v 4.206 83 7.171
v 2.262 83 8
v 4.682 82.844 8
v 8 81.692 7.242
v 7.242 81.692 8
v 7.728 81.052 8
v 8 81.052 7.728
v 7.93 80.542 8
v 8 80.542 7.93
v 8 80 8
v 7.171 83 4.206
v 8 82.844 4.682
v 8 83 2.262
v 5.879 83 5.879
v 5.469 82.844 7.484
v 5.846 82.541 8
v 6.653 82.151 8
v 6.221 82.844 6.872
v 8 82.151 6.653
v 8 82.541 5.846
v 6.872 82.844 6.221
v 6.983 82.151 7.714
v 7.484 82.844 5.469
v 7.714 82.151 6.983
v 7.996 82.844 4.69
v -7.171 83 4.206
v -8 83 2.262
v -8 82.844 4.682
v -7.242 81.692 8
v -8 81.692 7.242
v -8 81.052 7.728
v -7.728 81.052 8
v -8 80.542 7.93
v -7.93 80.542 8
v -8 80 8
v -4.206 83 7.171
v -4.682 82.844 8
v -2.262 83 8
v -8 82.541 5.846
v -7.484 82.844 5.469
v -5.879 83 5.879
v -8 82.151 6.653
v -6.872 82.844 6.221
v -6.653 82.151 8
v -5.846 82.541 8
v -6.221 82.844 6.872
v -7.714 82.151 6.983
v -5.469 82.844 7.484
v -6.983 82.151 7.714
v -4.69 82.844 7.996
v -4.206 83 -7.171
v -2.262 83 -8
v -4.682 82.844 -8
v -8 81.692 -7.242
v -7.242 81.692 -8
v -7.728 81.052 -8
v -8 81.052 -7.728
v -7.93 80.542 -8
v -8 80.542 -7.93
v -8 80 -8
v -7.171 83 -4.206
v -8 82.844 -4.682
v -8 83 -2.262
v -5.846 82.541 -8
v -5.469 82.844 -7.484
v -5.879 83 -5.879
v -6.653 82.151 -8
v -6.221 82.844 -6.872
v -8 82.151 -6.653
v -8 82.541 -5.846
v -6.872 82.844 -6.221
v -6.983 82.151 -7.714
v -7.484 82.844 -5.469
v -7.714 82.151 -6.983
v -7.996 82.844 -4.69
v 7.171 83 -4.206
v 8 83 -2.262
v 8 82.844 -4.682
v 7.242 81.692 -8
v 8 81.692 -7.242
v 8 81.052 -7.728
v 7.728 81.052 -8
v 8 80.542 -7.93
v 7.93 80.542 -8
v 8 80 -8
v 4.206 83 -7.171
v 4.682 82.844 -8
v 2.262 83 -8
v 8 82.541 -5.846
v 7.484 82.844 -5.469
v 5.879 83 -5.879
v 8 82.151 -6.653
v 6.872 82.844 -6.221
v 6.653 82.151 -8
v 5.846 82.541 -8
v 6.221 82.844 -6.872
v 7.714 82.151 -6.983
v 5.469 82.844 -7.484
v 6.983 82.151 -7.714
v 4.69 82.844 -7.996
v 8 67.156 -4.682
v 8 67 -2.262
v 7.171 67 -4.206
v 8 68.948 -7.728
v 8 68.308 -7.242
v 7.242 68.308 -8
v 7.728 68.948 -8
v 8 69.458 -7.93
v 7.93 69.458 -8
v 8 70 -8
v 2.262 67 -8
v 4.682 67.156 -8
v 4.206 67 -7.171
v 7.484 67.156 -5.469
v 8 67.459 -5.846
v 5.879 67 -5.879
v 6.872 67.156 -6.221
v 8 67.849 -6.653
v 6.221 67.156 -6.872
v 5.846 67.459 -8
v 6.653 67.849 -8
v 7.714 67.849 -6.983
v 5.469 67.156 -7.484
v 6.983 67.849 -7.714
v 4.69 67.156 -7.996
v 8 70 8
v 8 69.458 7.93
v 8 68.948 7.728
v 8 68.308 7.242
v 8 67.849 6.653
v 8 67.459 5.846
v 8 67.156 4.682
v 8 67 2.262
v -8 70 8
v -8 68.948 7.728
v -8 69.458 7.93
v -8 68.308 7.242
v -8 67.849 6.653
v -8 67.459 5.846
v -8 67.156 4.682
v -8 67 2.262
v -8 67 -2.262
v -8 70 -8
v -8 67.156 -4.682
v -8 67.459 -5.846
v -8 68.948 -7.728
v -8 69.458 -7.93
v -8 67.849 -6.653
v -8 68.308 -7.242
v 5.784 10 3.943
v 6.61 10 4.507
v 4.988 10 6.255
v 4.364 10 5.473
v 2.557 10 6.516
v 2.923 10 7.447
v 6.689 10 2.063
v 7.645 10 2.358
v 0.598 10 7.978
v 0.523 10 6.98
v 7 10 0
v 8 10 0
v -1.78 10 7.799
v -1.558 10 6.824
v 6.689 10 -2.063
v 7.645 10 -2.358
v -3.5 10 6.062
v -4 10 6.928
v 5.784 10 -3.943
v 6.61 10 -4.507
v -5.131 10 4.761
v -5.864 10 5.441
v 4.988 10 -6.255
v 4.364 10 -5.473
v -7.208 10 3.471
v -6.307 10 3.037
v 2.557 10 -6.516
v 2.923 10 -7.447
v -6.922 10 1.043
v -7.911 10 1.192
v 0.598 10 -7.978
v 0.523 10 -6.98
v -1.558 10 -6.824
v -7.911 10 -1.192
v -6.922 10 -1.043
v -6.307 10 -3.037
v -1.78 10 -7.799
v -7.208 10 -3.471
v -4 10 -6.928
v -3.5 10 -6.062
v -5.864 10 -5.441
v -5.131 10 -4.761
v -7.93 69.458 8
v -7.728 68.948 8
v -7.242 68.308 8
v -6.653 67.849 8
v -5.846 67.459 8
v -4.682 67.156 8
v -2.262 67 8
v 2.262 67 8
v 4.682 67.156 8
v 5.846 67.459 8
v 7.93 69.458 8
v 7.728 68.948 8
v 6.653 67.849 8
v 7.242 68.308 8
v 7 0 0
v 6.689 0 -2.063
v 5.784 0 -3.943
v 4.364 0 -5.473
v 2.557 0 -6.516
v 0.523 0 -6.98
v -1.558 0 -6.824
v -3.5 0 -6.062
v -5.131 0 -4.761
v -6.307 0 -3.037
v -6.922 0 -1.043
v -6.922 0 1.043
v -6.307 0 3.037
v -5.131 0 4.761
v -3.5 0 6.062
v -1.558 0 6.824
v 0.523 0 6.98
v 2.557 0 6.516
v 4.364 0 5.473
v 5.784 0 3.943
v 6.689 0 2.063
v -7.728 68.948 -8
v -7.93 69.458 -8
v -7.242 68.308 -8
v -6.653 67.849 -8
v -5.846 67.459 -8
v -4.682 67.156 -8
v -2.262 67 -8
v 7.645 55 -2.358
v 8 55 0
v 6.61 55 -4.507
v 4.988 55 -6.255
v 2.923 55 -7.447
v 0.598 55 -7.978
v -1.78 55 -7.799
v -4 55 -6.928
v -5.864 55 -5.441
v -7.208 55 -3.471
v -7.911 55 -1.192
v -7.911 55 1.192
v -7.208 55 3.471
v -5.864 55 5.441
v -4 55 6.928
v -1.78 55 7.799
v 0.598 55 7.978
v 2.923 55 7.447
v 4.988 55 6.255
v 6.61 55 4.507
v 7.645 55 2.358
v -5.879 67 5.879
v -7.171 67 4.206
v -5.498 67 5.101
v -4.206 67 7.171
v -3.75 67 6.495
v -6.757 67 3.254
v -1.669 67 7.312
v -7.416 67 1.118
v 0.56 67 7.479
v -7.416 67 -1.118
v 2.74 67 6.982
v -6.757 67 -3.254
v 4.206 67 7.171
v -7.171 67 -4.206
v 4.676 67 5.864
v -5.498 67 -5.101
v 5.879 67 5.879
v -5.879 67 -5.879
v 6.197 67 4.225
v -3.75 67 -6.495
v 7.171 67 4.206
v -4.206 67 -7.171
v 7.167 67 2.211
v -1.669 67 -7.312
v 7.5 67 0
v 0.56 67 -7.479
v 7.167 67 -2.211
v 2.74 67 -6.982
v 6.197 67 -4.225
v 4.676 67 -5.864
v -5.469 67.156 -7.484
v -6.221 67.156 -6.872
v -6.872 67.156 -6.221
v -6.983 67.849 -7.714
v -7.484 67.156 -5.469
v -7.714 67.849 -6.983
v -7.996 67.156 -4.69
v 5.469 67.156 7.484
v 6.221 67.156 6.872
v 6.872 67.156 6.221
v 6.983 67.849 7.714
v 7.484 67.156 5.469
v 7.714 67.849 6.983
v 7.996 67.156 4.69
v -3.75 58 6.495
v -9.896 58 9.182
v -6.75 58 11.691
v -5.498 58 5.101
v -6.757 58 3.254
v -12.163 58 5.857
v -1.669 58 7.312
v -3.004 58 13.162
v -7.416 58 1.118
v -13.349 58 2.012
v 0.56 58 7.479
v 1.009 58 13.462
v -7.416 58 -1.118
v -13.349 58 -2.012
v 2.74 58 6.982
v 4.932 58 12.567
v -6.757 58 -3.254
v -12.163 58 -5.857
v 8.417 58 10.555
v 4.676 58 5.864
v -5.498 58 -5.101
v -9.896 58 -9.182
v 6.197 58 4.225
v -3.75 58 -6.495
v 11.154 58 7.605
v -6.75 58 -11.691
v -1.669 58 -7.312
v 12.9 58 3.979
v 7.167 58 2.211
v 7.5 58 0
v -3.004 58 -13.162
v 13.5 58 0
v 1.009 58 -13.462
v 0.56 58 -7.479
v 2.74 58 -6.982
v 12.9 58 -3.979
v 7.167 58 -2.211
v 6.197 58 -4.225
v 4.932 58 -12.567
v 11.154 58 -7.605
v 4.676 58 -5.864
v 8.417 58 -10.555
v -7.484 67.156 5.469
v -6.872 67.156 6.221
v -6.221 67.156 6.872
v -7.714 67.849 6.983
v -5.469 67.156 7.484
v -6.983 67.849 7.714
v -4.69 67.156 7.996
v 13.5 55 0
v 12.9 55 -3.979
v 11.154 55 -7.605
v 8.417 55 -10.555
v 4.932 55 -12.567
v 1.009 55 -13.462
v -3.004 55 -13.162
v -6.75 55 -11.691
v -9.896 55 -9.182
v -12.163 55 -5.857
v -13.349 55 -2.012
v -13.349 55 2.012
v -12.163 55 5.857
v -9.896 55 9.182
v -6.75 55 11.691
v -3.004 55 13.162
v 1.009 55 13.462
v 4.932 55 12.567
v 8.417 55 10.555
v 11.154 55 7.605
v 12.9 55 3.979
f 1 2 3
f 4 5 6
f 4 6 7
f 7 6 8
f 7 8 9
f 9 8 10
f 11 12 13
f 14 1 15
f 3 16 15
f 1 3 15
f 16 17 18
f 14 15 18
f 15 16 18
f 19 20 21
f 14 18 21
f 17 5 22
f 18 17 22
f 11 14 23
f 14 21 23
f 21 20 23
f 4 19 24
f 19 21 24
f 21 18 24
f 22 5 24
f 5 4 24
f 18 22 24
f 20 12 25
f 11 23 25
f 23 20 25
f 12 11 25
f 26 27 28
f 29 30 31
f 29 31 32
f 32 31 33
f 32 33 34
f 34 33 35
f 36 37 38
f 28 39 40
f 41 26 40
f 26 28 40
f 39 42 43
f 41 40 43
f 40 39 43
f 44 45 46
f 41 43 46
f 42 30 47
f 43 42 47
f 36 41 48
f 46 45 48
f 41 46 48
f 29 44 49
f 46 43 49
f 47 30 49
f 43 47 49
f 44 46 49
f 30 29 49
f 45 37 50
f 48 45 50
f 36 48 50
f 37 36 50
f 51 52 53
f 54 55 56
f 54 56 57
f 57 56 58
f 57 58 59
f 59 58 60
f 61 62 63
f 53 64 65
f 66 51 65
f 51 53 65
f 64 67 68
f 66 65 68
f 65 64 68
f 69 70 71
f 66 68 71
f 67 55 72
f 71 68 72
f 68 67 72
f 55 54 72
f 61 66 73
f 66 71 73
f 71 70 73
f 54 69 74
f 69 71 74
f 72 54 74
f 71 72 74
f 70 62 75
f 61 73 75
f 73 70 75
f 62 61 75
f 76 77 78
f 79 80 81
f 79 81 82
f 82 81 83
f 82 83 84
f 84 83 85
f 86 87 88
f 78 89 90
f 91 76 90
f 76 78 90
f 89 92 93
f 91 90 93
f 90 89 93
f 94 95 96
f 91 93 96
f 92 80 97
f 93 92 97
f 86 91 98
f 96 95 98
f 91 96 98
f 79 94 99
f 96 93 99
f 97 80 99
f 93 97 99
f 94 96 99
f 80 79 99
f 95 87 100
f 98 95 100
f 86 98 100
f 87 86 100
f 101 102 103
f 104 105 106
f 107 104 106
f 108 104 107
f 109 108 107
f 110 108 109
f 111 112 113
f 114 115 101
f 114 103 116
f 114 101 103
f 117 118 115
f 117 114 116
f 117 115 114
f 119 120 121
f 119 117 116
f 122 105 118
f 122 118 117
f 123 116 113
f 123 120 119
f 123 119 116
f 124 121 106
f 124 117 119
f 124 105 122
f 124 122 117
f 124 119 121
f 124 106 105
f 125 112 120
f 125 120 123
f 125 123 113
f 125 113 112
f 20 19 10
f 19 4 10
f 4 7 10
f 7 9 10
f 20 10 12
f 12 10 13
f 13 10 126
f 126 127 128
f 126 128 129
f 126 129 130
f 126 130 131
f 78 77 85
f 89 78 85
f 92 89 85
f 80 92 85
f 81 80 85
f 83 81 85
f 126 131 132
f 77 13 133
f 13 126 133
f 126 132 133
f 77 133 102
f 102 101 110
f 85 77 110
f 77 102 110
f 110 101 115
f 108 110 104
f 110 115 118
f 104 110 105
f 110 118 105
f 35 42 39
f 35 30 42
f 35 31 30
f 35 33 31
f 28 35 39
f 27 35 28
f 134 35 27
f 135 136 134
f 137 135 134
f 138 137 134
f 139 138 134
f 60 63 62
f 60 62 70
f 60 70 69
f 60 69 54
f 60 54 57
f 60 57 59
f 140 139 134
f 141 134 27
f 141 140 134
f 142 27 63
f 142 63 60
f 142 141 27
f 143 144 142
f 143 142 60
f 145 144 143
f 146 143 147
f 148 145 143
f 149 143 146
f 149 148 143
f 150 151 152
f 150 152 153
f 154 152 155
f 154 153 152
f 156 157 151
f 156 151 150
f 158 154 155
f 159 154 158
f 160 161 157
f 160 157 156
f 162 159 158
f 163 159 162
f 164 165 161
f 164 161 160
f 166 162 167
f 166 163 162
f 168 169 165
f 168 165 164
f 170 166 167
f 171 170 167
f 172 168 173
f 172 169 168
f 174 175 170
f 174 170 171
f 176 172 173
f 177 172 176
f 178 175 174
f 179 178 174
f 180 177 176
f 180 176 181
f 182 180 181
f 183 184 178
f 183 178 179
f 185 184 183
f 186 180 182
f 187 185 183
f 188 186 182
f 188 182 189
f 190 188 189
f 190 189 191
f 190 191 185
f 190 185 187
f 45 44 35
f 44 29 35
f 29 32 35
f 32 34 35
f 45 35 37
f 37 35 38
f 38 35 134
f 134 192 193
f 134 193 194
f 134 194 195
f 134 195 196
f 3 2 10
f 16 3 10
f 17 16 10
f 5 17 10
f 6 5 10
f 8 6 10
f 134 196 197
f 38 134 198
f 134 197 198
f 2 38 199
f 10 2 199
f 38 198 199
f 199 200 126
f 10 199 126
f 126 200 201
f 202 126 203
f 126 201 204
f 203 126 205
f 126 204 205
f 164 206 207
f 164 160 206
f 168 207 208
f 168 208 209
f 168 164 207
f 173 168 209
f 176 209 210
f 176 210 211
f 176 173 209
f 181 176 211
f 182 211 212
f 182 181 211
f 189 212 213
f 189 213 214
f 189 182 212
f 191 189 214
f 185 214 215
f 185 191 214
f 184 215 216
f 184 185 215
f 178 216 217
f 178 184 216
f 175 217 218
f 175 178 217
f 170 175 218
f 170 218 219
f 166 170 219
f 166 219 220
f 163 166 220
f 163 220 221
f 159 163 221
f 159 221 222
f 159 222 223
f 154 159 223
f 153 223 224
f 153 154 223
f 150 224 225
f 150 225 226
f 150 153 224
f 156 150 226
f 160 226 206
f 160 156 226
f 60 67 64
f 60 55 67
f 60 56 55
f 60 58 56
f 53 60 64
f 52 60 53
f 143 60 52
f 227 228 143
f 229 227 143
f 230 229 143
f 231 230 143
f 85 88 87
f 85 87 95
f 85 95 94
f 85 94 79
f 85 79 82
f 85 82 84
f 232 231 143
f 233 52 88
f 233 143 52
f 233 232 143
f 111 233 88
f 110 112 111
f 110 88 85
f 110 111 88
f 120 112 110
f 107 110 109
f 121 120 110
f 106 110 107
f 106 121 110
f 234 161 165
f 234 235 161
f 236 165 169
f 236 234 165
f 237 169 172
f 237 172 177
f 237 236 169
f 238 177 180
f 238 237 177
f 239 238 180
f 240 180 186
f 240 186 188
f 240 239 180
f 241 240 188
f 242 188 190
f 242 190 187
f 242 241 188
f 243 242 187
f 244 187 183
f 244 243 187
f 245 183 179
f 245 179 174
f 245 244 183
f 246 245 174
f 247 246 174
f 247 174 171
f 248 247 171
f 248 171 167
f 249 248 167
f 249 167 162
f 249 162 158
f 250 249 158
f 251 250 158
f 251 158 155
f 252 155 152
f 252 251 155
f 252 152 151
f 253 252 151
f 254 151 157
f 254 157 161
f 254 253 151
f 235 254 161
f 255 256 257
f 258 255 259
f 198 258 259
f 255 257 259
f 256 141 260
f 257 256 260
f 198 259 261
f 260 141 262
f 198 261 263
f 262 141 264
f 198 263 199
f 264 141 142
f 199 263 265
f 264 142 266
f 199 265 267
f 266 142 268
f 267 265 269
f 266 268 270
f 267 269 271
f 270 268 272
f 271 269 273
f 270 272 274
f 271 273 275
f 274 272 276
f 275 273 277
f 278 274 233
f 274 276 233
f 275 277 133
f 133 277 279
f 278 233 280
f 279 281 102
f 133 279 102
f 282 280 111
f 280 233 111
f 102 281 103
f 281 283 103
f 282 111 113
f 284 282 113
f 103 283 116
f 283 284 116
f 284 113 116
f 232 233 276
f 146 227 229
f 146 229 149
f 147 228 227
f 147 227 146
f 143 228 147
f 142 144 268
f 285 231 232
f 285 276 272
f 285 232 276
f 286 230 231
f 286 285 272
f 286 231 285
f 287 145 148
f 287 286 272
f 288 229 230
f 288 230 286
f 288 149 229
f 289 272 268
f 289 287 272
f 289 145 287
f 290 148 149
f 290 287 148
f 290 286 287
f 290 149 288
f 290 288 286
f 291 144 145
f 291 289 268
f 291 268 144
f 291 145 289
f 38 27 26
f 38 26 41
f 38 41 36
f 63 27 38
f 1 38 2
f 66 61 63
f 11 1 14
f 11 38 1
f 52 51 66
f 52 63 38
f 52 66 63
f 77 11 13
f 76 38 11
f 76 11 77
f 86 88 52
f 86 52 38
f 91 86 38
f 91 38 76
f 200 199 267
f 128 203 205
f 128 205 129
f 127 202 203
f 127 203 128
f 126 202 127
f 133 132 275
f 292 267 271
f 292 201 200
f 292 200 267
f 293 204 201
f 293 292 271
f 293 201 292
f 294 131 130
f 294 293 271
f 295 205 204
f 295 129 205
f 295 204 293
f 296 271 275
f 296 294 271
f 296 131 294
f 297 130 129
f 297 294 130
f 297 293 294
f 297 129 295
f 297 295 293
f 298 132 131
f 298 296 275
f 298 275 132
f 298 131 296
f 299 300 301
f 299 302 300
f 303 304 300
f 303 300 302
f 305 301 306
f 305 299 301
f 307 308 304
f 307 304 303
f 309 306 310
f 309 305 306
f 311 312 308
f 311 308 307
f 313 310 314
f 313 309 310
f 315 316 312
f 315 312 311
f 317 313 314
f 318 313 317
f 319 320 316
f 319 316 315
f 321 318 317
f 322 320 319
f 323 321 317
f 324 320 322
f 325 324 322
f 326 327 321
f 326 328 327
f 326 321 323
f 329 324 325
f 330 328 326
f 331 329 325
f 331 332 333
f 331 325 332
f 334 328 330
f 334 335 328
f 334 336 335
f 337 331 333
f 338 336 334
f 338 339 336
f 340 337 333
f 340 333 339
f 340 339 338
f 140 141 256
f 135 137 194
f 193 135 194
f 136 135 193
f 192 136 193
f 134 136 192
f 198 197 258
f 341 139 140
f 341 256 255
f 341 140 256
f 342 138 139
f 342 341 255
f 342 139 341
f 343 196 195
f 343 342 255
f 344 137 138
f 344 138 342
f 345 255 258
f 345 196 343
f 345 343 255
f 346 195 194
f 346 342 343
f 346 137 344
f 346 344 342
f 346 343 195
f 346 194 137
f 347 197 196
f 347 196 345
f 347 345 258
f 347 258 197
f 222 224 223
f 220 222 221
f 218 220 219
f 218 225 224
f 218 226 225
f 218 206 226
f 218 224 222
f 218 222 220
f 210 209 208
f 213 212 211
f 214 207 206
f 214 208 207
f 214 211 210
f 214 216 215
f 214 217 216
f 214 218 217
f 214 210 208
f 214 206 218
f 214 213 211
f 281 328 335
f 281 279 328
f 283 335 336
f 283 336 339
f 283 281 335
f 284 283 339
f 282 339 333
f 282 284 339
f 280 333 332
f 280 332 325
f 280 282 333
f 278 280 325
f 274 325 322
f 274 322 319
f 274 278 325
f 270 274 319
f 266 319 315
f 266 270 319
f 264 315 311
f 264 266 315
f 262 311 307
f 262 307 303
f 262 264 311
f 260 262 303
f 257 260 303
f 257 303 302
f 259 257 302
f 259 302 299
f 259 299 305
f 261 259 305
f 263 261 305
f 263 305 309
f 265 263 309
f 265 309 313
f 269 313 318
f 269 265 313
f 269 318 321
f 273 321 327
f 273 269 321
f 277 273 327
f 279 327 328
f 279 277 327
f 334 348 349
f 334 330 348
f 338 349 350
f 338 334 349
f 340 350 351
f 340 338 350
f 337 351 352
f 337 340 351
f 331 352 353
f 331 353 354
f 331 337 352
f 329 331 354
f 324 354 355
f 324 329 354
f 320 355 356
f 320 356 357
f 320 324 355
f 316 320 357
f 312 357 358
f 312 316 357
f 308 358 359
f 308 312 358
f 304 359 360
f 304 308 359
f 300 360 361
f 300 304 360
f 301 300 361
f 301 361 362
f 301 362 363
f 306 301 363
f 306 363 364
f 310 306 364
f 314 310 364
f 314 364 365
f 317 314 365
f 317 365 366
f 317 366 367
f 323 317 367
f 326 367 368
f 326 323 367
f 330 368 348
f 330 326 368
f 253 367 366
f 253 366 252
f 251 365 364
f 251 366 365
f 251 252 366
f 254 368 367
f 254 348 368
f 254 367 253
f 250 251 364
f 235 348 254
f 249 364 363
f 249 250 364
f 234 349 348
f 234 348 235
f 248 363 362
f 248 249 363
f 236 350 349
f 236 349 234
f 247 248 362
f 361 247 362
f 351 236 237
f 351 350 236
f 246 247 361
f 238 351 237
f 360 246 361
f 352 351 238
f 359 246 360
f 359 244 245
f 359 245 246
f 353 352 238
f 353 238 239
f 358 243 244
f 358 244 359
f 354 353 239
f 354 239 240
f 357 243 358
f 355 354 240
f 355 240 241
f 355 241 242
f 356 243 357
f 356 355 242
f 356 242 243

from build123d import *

# Parameters (mm, degrees)
SKETCH2_W           = 16
SKETCH2_H           = 16
BOSS_EXTRUDE1_DEPTH = 16


with BuildPart() as part:
    # Sketch1 → Revolve1 (revolve)
    with BuildSketch(Plane.XY):
        Polygon((0, 0), (7, 0), (7, 10), (8, 10), (8, 55), (13.5, 55), (13.5, 58), (7.5, 58), (7.5, 67), (0, 67), align=None)
    revolve(axis=Axis((0, 0, 0), (0, 1, 0)))

    # Sketch2 → Boss-Extrude1 (add)
    with BuildSketch(Plane(origin=(0, 67, 0), x_dir=(1, 0, 0), z_dir=(0, 1, 0))):
        Rectangle(SKETCH2_W, SKETCH2_H)
    extrude(amount=BOSS_EXTRUDE1_DEPTH)

    # Sketch4 → Cut-Revolve1 (revolve, cut)
    with BuildSketch(Plane(origin=(0, 0, 0), x_dir=(0.707106781, 0, -0.707106781), z_dir=(0.707106781, 0, 0.707106781))):
        with BuildLine():
            Line((11.313708499, 83), (8.313708499, 83))
            ThreePointArc((8.313708499, 83), (10.435028843, 82.121320344), (11.313708499, 80))
            Line((11.313708499, 80), (11.313708499, 83))
        make_face()
        with BuildLine():
            Line((11.313708499, 67), (8.313708499, 67))
            ThreePointArc((8.313708499, 67), (10.435028843, 67.878679656), (11.313708499, 70))
            Line((11.313708499, 70), (11.313708499, 67))
        make_face()
    revolve(axis=Axis((0, 66.528771151, 0), (0, 1, 0)), mode=Mode.SUBTRACT)


solid = part.part
